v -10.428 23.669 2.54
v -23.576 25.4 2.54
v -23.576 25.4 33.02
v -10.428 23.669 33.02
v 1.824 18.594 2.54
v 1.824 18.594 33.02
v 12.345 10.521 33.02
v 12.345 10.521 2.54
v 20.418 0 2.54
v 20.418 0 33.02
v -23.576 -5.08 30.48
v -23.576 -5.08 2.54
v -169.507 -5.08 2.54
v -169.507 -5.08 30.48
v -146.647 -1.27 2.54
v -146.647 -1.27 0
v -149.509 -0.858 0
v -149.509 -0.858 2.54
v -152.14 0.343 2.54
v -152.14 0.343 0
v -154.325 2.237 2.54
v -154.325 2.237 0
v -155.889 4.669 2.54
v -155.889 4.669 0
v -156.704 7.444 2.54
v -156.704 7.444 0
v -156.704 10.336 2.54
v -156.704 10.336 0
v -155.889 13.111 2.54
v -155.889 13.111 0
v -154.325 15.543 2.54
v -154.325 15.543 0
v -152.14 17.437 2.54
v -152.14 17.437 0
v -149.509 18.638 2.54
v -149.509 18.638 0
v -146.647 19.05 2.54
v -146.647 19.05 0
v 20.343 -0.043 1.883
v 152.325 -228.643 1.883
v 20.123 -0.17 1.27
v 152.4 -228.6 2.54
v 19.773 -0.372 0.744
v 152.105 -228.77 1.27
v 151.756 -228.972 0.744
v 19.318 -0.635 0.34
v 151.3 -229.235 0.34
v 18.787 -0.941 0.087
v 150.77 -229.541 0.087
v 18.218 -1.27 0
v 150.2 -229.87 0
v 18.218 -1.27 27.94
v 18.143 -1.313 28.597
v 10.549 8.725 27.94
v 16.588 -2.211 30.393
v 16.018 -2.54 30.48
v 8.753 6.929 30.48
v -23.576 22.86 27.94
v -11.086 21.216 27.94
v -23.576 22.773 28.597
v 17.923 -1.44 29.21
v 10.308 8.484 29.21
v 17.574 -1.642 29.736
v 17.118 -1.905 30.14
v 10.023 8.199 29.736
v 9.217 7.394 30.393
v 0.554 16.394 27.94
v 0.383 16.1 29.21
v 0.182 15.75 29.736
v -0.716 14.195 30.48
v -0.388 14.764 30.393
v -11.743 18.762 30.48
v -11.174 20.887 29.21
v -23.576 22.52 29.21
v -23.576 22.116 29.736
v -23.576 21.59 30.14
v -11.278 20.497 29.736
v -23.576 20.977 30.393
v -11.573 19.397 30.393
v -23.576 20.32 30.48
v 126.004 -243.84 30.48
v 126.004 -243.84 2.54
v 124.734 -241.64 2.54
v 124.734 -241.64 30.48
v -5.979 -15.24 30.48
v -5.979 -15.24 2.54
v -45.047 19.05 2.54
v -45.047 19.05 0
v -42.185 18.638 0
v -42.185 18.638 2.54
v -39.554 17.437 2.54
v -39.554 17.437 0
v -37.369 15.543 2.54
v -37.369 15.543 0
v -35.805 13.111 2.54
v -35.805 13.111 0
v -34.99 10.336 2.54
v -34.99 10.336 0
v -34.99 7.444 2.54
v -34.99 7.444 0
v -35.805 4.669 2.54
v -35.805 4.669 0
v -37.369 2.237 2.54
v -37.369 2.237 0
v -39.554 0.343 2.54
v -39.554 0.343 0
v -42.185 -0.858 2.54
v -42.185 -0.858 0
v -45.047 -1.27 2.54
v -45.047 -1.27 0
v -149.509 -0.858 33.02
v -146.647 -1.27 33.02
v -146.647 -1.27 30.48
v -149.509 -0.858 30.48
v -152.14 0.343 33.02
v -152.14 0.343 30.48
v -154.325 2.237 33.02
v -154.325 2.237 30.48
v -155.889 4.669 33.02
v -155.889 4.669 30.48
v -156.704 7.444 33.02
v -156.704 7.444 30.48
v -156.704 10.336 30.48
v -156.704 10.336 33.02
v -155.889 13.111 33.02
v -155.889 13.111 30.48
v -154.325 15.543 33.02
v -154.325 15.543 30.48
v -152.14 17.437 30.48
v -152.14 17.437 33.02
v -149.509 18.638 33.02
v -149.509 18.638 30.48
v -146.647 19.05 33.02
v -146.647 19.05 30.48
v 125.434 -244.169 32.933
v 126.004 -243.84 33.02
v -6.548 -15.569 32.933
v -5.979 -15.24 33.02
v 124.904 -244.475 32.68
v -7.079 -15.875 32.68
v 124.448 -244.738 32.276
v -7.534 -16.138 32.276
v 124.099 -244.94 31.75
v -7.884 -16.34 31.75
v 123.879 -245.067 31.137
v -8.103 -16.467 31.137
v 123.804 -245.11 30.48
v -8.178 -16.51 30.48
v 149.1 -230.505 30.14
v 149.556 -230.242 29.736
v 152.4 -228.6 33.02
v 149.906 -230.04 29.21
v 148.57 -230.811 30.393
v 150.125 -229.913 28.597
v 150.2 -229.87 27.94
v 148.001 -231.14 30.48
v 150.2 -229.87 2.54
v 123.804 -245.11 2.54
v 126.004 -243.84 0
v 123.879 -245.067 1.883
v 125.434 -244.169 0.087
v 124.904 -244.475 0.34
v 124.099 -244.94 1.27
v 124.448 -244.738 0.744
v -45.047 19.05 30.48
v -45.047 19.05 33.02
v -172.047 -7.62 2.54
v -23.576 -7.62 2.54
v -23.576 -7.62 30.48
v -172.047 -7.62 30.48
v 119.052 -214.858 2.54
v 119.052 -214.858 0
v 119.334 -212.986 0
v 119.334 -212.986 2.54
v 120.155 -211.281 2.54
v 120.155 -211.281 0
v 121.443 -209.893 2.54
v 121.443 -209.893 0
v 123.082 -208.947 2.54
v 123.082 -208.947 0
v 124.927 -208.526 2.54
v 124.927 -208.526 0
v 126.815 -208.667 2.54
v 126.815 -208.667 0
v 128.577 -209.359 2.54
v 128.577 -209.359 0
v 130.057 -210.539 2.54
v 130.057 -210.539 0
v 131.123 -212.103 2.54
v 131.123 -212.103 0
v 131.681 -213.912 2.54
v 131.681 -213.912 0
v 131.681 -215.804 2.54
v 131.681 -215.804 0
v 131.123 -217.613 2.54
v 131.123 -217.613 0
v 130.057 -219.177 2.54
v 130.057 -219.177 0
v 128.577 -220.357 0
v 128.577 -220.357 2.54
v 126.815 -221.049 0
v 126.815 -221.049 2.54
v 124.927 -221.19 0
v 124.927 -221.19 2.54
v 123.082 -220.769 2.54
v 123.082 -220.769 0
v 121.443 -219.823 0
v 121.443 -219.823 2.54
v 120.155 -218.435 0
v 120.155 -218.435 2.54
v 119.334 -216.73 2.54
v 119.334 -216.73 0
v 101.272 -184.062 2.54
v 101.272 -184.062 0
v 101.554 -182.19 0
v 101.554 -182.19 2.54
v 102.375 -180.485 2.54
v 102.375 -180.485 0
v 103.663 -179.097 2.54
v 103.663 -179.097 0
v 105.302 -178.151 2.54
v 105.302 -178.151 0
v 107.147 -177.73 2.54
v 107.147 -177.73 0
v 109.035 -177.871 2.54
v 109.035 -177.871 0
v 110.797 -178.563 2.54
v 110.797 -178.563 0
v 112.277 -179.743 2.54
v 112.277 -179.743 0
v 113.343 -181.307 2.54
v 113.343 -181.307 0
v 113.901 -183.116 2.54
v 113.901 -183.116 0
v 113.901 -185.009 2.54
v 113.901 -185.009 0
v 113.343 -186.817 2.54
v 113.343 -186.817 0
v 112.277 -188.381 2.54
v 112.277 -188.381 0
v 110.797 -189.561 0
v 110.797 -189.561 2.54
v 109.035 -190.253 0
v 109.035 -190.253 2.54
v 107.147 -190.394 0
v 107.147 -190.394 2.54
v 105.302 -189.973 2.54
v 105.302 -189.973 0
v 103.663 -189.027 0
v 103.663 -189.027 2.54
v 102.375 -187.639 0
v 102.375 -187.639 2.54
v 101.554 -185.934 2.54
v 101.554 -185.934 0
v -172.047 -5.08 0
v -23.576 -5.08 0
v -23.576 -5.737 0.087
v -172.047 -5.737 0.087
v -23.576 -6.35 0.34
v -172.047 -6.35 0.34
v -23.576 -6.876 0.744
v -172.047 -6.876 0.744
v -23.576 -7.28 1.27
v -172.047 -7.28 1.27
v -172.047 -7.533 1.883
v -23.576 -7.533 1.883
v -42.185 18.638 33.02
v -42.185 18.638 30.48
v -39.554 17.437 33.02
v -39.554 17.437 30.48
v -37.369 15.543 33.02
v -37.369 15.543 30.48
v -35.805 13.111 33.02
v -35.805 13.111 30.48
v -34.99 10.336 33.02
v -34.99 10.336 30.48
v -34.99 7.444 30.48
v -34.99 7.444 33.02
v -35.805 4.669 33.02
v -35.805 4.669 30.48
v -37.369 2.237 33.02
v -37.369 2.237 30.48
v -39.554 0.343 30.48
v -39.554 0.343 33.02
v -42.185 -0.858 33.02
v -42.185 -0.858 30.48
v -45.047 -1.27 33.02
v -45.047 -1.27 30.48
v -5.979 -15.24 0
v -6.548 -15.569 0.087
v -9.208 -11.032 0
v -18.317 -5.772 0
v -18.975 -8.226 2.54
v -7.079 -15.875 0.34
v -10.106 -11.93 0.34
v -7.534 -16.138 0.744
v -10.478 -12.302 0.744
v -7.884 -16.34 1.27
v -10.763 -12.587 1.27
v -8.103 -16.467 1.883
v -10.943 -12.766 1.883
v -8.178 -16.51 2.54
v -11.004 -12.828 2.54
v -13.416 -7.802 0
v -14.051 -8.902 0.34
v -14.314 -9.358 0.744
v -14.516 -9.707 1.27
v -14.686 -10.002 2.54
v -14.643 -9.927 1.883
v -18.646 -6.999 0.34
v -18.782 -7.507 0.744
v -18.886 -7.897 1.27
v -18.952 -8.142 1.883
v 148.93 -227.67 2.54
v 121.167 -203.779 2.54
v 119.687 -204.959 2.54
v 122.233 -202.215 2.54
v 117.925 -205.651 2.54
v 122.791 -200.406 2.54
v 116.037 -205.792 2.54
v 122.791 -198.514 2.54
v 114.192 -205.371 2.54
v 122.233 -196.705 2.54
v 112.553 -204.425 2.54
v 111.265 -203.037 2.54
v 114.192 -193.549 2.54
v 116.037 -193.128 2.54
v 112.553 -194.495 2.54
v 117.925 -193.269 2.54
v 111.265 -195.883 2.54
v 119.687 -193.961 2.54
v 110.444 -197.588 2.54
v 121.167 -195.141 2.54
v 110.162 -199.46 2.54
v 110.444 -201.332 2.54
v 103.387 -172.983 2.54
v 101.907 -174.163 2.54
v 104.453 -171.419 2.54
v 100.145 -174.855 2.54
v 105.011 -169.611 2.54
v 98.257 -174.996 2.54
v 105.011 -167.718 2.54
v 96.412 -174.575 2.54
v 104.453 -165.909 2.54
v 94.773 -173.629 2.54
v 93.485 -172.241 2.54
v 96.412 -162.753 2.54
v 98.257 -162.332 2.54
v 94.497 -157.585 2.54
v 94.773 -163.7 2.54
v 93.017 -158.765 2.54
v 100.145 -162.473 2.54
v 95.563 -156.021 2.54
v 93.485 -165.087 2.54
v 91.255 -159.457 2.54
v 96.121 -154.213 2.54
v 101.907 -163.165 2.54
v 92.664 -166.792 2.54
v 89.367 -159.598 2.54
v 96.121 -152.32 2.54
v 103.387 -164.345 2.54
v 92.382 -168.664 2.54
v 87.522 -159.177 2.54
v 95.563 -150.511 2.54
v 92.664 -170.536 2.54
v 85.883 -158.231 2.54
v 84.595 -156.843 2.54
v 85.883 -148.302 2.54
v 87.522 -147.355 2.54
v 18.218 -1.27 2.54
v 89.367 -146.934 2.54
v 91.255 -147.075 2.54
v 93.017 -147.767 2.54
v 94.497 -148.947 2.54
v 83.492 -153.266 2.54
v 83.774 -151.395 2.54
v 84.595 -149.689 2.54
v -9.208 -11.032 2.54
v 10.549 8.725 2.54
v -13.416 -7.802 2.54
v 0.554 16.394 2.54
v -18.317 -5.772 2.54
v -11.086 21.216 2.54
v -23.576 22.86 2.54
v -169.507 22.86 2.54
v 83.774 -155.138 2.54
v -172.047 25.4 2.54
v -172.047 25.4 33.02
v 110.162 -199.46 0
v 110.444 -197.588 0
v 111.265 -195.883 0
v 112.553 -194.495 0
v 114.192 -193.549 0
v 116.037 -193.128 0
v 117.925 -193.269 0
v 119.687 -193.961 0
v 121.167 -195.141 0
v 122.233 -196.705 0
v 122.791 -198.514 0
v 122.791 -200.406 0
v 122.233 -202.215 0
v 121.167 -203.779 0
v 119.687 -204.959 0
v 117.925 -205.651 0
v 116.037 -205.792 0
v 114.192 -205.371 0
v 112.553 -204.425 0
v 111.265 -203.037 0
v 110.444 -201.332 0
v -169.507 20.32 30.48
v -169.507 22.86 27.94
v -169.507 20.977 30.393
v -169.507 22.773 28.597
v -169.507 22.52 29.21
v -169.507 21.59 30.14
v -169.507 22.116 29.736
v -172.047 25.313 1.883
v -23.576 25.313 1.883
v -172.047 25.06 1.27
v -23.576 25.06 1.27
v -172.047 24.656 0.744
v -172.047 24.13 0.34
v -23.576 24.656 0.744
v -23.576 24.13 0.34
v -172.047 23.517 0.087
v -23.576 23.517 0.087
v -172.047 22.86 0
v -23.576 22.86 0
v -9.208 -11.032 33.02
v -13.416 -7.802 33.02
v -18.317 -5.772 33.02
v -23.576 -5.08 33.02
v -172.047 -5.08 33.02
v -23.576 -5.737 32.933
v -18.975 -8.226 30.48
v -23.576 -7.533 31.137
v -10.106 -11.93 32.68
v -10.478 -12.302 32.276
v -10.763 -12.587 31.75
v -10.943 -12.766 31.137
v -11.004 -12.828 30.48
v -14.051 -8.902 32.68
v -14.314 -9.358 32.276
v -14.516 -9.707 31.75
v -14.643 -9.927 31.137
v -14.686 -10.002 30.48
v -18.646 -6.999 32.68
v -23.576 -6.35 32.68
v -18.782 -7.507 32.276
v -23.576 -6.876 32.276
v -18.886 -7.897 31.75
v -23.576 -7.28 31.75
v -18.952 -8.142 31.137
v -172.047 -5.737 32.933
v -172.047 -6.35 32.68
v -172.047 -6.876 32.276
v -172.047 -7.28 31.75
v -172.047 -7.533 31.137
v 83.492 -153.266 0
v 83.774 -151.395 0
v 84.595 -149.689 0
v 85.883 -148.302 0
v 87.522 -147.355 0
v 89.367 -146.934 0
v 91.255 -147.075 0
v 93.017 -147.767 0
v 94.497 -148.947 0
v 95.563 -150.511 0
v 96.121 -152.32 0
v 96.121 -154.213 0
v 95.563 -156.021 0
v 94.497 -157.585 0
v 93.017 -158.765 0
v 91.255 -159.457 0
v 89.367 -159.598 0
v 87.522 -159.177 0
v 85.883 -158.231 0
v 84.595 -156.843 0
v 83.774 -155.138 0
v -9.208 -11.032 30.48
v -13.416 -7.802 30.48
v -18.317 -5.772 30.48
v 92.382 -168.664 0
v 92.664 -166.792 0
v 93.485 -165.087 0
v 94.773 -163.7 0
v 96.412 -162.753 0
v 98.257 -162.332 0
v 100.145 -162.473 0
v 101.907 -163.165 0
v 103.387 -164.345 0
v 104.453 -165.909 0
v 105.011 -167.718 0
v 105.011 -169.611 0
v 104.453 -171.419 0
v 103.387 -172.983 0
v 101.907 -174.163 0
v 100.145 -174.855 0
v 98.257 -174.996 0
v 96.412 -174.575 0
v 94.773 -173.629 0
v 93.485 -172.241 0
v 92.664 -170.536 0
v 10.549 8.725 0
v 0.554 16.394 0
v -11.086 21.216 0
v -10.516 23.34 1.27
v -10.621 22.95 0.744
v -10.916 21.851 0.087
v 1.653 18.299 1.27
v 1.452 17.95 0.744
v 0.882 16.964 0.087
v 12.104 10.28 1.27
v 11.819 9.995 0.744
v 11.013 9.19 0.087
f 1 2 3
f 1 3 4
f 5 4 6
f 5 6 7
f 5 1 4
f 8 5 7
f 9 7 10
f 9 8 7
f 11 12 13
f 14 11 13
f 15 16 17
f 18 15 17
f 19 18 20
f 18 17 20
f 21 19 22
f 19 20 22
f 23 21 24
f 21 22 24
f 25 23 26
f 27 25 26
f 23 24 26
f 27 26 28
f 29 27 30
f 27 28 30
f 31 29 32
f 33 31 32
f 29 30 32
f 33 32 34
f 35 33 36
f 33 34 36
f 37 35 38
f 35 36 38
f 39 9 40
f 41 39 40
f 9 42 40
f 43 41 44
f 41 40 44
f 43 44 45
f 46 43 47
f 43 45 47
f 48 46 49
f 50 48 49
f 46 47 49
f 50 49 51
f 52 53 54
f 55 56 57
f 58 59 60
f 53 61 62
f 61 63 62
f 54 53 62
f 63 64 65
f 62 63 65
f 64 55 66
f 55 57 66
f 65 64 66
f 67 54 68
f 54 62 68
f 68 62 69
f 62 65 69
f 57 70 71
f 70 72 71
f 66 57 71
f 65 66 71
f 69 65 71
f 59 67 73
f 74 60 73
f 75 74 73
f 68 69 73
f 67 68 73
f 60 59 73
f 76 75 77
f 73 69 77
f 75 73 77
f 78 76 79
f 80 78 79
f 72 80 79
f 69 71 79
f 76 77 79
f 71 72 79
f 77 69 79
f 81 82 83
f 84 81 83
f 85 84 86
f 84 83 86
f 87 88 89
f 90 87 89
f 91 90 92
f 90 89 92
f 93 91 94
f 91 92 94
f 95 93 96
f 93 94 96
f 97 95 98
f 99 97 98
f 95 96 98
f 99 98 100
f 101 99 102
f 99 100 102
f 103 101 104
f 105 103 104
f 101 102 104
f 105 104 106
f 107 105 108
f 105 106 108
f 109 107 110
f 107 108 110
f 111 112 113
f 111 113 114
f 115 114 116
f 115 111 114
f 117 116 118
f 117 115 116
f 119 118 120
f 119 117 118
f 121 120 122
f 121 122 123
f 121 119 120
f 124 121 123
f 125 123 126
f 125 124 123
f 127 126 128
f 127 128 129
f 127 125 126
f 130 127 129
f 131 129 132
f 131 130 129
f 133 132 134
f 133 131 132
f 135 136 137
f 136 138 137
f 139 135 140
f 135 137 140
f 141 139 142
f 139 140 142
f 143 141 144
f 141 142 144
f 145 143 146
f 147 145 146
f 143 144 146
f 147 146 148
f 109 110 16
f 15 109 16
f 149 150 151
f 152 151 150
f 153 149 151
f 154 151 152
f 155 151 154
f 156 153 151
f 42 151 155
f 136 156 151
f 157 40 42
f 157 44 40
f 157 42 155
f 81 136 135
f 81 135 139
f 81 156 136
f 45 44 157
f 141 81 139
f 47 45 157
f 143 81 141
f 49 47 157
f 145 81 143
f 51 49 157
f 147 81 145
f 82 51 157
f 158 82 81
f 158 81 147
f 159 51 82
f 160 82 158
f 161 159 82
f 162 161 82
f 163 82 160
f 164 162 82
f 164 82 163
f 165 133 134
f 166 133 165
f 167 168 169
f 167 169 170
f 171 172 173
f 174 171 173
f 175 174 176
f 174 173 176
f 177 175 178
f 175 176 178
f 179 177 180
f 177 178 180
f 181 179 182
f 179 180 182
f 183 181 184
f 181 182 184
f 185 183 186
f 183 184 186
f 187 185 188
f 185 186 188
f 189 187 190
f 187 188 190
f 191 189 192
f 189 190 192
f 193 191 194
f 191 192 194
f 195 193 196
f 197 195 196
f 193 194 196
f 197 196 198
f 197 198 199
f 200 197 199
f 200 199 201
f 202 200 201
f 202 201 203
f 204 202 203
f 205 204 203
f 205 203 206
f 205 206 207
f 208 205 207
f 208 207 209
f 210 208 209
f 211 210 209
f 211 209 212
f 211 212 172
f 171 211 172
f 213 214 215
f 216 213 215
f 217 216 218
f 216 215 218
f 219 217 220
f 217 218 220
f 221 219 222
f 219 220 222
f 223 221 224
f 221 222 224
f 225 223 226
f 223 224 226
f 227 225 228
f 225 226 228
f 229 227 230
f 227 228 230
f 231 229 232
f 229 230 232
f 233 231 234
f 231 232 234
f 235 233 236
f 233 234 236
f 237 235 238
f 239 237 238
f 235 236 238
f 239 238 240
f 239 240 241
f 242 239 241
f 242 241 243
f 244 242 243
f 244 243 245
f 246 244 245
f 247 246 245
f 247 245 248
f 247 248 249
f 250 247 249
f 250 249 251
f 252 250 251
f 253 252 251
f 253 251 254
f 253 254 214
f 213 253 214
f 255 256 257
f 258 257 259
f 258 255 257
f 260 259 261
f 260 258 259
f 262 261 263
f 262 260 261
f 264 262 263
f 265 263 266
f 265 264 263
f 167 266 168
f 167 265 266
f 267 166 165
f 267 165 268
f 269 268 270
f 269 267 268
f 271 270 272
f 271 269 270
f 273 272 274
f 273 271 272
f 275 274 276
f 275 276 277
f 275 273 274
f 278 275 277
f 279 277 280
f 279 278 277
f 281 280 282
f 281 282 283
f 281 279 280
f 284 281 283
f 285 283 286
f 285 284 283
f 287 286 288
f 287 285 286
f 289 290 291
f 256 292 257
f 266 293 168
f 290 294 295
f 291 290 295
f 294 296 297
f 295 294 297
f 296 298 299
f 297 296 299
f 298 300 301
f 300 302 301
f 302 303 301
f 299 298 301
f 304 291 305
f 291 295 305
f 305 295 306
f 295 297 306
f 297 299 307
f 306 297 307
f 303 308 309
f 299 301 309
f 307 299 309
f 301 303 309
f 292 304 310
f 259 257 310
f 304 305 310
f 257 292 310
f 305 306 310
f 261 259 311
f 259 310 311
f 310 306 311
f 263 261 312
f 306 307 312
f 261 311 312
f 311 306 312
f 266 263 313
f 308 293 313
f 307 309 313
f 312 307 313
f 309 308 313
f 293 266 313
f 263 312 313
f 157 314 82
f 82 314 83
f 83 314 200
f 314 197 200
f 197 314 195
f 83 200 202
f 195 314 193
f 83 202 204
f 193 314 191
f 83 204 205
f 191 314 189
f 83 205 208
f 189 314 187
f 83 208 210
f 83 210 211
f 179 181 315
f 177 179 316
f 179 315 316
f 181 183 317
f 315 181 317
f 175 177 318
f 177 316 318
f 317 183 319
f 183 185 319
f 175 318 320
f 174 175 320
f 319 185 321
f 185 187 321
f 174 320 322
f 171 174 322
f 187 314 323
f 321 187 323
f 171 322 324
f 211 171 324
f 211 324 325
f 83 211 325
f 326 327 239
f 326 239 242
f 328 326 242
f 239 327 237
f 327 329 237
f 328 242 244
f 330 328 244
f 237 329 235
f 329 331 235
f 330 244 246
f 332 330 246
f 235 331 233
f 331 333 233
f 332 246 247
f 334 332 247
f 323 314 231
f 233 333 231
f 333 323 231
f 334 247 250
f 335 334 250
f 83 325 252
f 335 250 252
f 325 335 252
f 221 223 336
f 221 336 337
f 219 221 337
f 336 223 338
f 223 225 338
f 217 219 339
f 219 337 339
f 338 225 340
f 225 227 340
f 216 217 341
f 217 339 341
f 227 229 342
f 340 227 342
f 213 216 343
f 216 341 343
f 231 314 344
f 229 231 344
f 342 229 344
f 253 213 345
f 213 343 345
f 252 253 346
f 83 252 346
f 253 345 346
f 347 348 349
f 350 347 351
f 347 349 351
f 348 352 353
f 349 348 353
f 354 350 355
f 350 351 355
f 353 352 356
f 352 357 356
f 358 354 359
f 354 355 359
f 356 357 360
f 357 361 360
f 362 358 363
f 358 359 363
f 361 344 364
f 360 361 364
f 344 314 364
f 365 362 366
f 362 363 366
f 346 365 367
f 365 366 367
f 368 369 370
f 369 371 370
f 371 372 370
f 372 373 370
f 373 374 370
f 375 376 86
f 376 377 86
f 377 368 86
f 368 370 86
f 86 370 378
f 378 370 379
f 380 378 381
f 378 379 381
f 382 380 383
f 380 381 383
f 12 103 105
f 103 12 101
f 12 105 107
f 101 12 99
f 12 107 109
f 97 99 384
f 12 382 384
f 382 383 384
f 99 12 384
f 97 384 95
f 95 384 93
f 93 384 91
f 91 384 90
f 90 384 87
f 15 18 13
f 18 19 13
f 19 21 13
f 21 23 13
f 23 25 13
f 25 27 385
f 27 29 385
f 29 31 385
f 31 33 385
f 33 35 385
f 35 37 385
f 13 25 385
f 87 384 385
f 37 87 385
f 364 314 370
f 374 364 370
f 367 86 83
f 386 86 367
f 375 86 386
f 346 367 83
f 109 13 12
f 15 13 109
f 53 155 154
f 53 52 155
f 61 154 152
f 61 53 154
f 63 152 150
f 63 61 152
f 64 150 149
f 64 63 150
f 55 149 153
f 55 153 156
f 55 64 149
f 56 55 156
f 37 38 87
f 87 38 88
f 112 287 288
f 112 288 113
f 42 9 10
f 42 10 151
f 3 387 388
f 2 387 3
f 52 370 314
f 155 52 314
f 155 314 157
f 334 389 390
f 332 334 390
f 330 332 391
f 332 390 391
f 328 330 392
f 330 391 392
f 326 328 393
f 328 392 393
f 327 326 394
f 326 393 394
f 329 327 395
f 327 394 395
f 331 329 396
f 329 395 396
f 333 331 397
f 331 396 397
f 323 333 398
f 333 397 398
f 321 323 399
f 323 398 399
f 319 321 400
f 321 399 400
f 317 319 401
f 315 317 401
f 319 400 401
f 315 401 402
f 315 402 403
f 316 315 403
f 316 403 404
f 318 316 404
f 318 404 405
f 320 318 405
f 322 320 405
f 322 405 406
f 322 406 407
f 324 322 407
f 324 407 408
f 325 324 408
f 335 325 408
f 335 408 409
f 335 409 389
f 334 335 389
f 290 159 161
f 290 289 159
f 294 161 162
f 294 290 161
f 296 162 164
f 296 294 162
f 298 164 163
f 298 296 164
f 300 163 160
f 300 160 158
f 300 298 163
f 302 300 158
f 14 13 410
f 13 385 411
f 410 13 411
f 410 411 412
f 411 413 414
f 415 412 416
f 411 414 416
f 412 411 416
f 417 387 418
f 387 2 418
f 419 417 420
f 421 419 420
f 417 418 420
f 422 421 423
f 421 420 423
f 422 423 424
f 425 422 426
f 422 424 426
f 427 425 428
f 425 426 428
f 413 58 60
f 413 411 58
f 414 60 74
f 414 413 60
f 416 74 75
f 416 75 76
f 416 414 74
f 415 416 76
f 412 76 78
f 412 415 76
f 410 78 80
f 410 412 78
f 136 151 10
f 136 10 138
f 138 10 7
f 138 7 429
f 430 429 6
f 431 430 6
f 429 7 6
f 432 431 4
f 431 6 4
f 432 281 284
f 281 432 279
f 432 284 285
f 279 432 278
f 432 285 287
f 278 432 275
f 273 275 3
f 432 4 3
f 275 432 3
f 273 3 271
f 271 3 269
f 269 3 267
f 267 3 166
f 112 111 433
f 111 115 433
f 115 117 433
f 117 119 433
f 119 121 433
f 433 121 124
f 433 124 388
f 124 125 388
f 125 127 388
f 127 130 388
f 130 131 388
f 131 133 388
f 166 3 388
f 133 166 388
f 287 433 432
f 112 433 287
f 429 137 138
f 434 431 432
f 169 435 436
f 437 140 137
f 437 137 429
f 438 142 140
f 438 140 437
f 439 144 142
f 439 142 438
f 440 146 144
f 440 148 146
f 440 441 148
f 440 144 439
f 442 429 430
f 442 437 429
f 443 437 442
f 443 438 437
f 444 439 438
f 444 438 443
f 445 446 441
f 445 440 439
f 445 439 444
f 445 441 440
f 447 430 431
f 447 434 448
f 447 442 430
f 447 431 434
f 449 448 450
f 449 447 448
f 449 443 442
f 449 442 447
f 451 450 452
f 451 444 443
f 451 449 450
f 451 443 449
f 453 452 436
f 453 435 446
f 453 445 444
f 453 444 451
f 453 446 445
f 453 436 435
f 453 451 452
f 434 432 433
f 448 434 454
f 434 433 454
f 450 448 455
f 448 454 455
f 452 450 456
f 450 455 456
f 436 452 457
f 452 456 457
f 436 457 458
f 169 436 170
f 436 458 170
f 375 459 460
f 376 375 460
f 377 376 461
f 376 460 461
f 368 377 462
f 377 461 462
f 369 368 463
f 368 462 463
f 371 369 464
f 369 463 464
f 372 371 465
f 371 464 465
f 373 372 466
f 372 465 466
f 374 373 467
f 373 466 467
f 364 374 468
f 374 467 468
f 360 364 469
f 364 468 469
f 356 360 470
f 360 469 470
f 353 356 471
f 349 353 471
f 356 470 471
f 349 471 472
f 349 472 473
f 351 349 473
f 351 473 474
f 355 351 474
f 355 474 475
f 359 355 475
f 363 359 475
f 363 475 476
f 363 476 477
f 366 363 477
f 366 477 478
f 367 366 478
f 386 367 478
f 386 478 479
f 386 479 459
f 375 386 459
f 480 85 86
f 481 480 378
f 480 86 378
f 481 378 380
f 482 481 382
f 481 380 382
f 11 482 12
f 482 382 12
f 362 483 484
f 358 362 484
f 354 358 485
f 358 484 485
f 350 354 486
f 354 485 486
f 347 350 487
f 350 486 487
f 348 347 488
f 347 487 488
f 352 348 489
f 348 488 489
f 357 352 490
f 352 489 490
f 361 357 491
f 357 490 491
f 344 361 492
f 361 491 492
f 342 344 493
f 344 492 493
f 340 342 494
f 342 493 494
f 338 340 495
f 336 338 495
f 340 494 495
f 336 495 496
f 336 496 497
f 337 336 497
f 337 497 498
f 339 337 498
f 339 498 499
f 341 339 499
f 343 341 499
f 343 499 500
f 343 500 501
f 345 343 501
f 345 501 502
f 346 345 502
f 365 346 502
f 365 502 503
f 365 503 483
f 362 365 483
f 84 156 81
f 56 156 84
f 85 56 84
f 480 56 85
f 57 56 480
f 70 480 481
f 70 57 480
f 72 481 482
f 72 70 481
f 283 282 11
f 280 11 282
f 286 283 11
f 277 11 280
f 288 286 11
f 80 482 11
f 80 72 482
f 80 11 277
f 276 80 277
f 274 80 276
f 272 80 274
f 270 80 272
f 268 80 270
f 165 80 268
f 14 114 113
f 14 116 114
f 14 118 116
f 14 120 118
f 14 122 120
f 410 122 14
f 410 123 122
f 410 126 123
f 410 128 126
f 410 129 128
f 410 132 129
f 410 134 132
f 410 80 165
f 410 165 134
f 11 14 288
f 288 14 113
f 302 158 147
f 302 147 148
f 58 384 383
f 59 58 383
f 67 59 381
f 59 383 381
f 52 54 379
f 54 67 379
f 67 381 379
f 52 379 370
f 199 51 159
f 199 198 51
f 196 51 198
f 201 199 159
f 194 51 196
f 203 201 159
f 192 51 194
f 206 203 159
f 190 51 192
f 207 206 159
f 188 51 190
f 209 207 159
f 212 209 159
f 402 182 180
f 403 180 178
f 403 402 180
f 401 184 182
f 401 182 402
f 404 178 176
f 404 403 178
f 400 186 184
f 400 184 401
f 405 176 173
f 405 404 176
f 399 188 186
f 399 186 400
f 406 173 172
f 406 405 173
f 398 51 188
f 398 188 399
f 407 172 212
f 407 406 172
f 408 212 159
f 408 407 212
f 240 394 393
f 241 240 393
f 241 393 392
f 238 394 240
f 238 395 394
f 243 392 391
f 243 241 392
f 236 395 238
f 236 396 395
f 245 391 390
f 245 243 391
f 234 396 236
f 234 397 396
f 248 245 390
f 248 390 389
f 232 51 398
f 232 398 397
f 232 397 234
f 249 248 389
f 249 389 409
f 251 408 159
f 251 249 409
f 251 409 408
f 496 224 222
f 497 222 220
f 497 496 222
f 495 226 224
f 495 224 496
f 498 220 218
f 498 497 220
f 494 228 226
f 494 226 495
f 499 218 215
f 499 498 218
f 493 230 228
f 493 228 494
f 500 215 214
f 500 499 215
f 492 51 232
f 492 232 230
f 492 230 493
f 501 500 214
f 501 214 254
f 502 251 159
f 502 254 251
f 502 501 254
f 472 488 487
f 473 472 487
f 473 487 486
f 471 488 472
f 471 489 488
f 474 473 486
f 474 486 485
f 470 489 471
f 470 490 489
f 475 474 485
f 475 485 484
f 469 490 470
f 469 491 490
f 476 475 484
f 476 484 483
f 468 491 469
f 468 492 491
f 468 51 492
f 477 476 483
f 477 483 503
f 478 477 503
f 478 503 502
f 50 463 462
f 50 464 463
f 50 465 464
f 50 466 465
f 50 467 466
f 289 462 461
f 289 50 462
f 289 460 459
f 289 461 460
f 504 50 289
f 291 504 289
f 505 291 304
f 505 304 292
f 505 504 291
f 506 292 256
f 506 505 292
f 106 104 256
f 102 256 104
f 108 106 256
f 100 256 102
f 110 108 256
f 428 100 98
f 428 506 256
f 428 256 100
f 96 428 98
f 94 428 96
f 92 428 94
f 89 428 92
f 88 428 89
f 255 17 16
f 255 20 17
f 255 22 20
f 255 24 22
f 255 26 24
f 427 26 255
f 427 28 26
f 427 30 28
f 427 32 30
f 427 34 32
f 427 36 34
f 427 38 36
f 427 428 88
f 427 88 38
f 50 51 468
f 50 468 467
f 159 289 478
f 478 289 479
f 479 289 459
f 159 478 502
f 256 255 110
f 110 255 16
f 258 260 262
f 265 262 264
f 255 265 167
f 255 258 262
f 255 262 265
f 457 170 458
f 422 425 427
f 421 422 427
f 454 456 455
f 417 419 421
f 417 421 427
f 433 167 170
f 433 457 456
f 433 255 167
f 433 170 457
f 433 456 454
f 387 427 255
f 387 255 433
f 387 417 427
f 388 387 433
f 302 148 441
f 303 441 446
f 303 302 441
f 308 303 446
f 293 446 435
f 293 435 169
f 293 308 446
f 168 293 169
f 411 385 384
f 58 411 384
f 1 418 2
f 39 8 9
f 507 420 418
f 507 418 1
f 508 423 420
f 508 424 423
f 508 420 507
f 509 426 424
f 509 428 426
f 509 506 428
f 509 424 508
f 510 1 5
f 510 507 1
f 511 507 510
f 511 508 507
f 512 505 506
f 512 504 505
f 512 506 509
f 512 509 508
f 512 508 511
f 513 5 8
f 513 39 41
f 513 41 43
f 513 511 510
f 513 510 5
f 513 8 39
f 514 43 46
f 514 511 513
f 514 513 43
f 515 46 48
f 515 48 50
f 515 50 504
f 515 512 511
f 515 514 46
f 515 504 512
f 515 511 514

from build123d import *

# Parameters (mm, degrees)
BOSS_EXTRUDE1_DEPTH = 33.02
SHELL1_T            = -2.54
CUT_EXTRUDE1_REACH  = 409.111
SKETCH2_W           = 27.94
SKETCH2_H           = 27.94
CUT_EXTRUDE2_DEPTH  = 2.54
CUT_EXTRUDE3_REACH  = 303.28
CUT_EXTRUDE4_REACH  = 303.28
SKETCH6_R           = 6.35
CUT_EXTRUDE5_REACH  = 303.28
SKETCH7_R           = 6.35
SKETCH8_W           = 27.94
SKETCH8_H           = 27.94
BOSS_EXTRUDE2_DEPTH = 2.54
FILLET1_R           = 2.54


with BuildPart() as part:
    # Sketch1 → Boss-Extrude1 (new body)
    with BuildSketch(Plane.XY):
        with BuildLine():
            Line((-172.046968374, 25.4), (-23.576362049, 25.4))
            ThreePointArc((-23.576362049, 25.4), (1.823637951, 18.594090512), (20.417728463, 0))
            Line((20.417728463, 0), (152.4, -228.6))
            Line((152.4, -228.6), (123.803841167, -245.11))
            Line((123.803841167, -245.11), (-8.17843037, -16.51))
            ThreePointArc((-8.17843037, -16.51), (-14.686362049, -10.002068321), (-23.576362049, -7.62))
            Line((-23.576362049, -7.62), (-172.046968374, -7.62))
            Line((-172.046968374, -7.62), (-172.046968374, 25.4))
        make_face()
    extrude(amount=BOSS_EXTRUDE1_DEPTH)

    # Shell1
    shell1_openings = [part.faces().sort_by_distance(p)[0] for p in [
        (-172.046968374, 8.89, 16.51),
    ]]
    offset(amount=SHELL1_T, openings=shell1_openings, kind=Kind.INTERSECTION)

    # Sketch2 → Cut-Extrude1 (cut, up to next)
    with BuildSketch(Plane(origin=(137.086703653, -237.441135768, 0), x_dir=(0.8660254037844406, 0.4999999999999967, 0), z_dir=(0.4999999999999967, -0.8660254037844406, 0)), mode=Mode.PRIVATE) as cut_extrude1_sk1:
        with Locations((1.172271537, 16.51)):
            Rectangle(SKETCH2_W, SKETCH2_H)
    cut_extrude1_tool1 = extrude(cut_extrude1_sk1.sketch, amount=-CUT_EXTRUDE1_REACH, mode=Mode.PRIVATE) & part.part
    add(cut_extrude1_tool1.solids().sort_by_distance((138.101921, -236.855, 16.51))[0], mode=Mode.SUBTRACT)

    # Sketch3 → Cut-Extrude2 (cut)
    with BuildSketch(Plane.XY.offset(33.02)):
        with BuildLine():
            Line((-146.646968374, 19.05), (-45.046968374, 19.05))
            ThreePointArc((-45.046968374, 19.05), (-34.886968374, 8.89), (-45.046968374, -1.27))
            Line((-45.046968374, -1.27), (-50.126968374, -1.27))
            Line((-50.126968374, -1.27), (-146.646968374, -1.27))
            ThreePointArc((-146.646968374, -1.27), (-156.806968374, 8.89), (-146.646968374, 19.05))
        make_face()
    extrude(amount=-CUT_EXTRUDE2_DEPTH, mode=Mode.SUBTRACT)

    # Sketch4 → Cut-Extrude3 (cut, up to next)
    with BuildSketch(Plane(origin=(0, 0, 0), x_dir=(-1, 0, 0), z_dir=(0, 0, -1)), mode=Mode.PRIVATE) as cut_extrude3_sk1:
        with BuildLine():
            Line((45.046968374, -1.27), (146.646968374, -1.27))
            ThreePointArc((146.646968374, -1.27), (156.806968374, 8.89), (146.646968374, 19.05))
            Line((146.646968374, 19.05), (45.046968374, 19.05))
            ThreePointArc((45.046968374, 19.05), (34.886968374, 8.89), (45.046968374, -1.27))
        make_face()
    cut_extrude3_tool1 = extrude(cut_extrude3_sk1.sketch, amount=-CUT_EXTRUDE3_REACH, mode=Mode.PRIVATE) & part.part
    add(cut_extrude3_tool1.solids().sort_by_distance((-95.846968, 8.89, 0))[0], mode=Mode.SUBTRACT)

    # Sketch6 → Cut-Extrude4 (cut, up to next)
    with BuildSketch(Plane(origin=(0, 0, 0), x_dir=(-1, 0, 0), z_dir=(0, 0, -1)), mode=Mode.PRIVATE) as cut_extrude4_sk1:
        with Locations((-116.511920584, -199.460023065)):
            Circle(SKETCH6_R)
    cut_extrude4_tool1 = extrude(cut_extrude4_sk1.sketch, amount=-CUT_EXTRUDE4_REACH, mode=Mode.PRIVATE) & part.part
    # Sketch6 → Cut-Extrude4 (cut, up to next)
    with BuildSketch(Plane(origin=(0, 0, 0), x_dir=(-1, 0, 0), z_dir=(0, 0, -1)), mode=Mode.PRIVATE) as cut_extrude4_sk2:
        with Locations((-107.621920584, -184.062091385)):
            Circle(SKETCH6_R)
    cut_extrude4_tool2 = extrude(cut_extrude4_sk2.sketch, amount=-CUT_EXTRUDE4_REACH, mode=Mode.PRIVATE) & part.part
    # Sketch6 → Cut-Extrude4 (cut, up to next)
    with BuildSketch(Plane(origin=(0, 0, 0), x_dir=(-1, 0, 0), z_dir=(0, 0, -1)), mode=Mode.PRIVATE) as cut_extrude4_sk3:
        with Locations((-98.731920584, -168.664159706)):
            Circle(SKETCH6_R)
    cut_extrude4_tool3 = extrude(cut_extrude4_sk3.sketch, amount=-CUT_EXTRUDE4_REACH, mode=Mode.PRIVATE) & part.part
    # Sketch6 → Cut-Extrude4 (cut, up to next)
    with BuildSketch(Plane(origin=(0, 0, 0), x_dir=(-1, 0, 0), z_dir=(0, 0, -1)), mode=Mode.PRIVATE) as cut_extrude4_sk4:
        with Locations((-89.841920584, -153.266228027)):
            Circle(SKETCH6_R)
    cut_extrude4_tool4 = extrude(cut_extrude4_sk4.sketch, amount=-CUT_EXTRUDE4_REACH, mode=Mode.PRIVATE) & part.part
    add(cut_extrude4_tool1.solids().sort_by_distance((116.511921, -199.460023, 0))[0], mode=Mode.SUBTRACT)
    add(cut_extrude4_tool2.solids().sort_by_distance((107.621921, -184.062091, 0))[0], mode=Mode.SUBTRACT)
    add(cut_extrude4_tool3.solids().sort_by_distance((98.731921, -168.66416, 0))[0], mode=Mode.SUBTRACT)
    add(cut_extrude4_tool4.solids().sort_by_distance((89.841921, -153.266228, 0))[0], mode=Mode.SUBTRACT)

    # Sketch7 → Cut-Extrude5 (cut, up to next)
    with BuildSketch(Plane(origin=(0, 0, 0), x_dir=(-1, 0, 0), z_dir=(0, 0, -1)), mode=Mode.PRIVATE) as cut_extrude5_sk1:
        with Locations((-125.401920584, -214.857954744)):
            Circle(SKETCH7_R)
    cut_extrude5_tool1 = extrude(cut_extrude5_sk1.sketch, amount=-CUT_EXTRUDE5_REACH, mode=Mode.PRIVATE) & part.part
    add(cut_extrude5_tool1.solids().sort_by_distance((125.401921, -214.857955, 0))[0], mode=Mode.SUBTRACT)

    # Sketch8 → Boss-Extrude2 (add)
    with BuildSketch(Plane.ZY.offset(172.046968374)):
        with Locations((16.51, 8.89)):
            Rectangle(SKETCH8_W, SKETCH8_H)
    extrude(amount=-BOSS_EXTRUDE2_DEPTH)

    # Fillet1
    fillet1_edges = [part.edges().sort_by_distance(p)[0] for p in [
        (57.812705399, -130.81, 0),
        (-14.686362049, -10.002068321, 0),
        (-97.811665212, -7.62, 0),
        (-14.686362049, -10.002068321, 33.02),
        (57.812705399, -130.81, 33.02),
        (84.209159706, -115.57, 30.48),
        (0.553637951, 16.394385987, 30.48),
        (-96.541665212, 22.86, 30.48),
        (-97.811665212, 25.4, 0),
        (-97.811665212, -7.62, 33.02),
        (1.823637951, 18.594090512, 0),
        (86.408864232, -114.3, 0),
    ]]
    fillet(fillet1_edges, radius=FILLET1_R)


solid = part.part
